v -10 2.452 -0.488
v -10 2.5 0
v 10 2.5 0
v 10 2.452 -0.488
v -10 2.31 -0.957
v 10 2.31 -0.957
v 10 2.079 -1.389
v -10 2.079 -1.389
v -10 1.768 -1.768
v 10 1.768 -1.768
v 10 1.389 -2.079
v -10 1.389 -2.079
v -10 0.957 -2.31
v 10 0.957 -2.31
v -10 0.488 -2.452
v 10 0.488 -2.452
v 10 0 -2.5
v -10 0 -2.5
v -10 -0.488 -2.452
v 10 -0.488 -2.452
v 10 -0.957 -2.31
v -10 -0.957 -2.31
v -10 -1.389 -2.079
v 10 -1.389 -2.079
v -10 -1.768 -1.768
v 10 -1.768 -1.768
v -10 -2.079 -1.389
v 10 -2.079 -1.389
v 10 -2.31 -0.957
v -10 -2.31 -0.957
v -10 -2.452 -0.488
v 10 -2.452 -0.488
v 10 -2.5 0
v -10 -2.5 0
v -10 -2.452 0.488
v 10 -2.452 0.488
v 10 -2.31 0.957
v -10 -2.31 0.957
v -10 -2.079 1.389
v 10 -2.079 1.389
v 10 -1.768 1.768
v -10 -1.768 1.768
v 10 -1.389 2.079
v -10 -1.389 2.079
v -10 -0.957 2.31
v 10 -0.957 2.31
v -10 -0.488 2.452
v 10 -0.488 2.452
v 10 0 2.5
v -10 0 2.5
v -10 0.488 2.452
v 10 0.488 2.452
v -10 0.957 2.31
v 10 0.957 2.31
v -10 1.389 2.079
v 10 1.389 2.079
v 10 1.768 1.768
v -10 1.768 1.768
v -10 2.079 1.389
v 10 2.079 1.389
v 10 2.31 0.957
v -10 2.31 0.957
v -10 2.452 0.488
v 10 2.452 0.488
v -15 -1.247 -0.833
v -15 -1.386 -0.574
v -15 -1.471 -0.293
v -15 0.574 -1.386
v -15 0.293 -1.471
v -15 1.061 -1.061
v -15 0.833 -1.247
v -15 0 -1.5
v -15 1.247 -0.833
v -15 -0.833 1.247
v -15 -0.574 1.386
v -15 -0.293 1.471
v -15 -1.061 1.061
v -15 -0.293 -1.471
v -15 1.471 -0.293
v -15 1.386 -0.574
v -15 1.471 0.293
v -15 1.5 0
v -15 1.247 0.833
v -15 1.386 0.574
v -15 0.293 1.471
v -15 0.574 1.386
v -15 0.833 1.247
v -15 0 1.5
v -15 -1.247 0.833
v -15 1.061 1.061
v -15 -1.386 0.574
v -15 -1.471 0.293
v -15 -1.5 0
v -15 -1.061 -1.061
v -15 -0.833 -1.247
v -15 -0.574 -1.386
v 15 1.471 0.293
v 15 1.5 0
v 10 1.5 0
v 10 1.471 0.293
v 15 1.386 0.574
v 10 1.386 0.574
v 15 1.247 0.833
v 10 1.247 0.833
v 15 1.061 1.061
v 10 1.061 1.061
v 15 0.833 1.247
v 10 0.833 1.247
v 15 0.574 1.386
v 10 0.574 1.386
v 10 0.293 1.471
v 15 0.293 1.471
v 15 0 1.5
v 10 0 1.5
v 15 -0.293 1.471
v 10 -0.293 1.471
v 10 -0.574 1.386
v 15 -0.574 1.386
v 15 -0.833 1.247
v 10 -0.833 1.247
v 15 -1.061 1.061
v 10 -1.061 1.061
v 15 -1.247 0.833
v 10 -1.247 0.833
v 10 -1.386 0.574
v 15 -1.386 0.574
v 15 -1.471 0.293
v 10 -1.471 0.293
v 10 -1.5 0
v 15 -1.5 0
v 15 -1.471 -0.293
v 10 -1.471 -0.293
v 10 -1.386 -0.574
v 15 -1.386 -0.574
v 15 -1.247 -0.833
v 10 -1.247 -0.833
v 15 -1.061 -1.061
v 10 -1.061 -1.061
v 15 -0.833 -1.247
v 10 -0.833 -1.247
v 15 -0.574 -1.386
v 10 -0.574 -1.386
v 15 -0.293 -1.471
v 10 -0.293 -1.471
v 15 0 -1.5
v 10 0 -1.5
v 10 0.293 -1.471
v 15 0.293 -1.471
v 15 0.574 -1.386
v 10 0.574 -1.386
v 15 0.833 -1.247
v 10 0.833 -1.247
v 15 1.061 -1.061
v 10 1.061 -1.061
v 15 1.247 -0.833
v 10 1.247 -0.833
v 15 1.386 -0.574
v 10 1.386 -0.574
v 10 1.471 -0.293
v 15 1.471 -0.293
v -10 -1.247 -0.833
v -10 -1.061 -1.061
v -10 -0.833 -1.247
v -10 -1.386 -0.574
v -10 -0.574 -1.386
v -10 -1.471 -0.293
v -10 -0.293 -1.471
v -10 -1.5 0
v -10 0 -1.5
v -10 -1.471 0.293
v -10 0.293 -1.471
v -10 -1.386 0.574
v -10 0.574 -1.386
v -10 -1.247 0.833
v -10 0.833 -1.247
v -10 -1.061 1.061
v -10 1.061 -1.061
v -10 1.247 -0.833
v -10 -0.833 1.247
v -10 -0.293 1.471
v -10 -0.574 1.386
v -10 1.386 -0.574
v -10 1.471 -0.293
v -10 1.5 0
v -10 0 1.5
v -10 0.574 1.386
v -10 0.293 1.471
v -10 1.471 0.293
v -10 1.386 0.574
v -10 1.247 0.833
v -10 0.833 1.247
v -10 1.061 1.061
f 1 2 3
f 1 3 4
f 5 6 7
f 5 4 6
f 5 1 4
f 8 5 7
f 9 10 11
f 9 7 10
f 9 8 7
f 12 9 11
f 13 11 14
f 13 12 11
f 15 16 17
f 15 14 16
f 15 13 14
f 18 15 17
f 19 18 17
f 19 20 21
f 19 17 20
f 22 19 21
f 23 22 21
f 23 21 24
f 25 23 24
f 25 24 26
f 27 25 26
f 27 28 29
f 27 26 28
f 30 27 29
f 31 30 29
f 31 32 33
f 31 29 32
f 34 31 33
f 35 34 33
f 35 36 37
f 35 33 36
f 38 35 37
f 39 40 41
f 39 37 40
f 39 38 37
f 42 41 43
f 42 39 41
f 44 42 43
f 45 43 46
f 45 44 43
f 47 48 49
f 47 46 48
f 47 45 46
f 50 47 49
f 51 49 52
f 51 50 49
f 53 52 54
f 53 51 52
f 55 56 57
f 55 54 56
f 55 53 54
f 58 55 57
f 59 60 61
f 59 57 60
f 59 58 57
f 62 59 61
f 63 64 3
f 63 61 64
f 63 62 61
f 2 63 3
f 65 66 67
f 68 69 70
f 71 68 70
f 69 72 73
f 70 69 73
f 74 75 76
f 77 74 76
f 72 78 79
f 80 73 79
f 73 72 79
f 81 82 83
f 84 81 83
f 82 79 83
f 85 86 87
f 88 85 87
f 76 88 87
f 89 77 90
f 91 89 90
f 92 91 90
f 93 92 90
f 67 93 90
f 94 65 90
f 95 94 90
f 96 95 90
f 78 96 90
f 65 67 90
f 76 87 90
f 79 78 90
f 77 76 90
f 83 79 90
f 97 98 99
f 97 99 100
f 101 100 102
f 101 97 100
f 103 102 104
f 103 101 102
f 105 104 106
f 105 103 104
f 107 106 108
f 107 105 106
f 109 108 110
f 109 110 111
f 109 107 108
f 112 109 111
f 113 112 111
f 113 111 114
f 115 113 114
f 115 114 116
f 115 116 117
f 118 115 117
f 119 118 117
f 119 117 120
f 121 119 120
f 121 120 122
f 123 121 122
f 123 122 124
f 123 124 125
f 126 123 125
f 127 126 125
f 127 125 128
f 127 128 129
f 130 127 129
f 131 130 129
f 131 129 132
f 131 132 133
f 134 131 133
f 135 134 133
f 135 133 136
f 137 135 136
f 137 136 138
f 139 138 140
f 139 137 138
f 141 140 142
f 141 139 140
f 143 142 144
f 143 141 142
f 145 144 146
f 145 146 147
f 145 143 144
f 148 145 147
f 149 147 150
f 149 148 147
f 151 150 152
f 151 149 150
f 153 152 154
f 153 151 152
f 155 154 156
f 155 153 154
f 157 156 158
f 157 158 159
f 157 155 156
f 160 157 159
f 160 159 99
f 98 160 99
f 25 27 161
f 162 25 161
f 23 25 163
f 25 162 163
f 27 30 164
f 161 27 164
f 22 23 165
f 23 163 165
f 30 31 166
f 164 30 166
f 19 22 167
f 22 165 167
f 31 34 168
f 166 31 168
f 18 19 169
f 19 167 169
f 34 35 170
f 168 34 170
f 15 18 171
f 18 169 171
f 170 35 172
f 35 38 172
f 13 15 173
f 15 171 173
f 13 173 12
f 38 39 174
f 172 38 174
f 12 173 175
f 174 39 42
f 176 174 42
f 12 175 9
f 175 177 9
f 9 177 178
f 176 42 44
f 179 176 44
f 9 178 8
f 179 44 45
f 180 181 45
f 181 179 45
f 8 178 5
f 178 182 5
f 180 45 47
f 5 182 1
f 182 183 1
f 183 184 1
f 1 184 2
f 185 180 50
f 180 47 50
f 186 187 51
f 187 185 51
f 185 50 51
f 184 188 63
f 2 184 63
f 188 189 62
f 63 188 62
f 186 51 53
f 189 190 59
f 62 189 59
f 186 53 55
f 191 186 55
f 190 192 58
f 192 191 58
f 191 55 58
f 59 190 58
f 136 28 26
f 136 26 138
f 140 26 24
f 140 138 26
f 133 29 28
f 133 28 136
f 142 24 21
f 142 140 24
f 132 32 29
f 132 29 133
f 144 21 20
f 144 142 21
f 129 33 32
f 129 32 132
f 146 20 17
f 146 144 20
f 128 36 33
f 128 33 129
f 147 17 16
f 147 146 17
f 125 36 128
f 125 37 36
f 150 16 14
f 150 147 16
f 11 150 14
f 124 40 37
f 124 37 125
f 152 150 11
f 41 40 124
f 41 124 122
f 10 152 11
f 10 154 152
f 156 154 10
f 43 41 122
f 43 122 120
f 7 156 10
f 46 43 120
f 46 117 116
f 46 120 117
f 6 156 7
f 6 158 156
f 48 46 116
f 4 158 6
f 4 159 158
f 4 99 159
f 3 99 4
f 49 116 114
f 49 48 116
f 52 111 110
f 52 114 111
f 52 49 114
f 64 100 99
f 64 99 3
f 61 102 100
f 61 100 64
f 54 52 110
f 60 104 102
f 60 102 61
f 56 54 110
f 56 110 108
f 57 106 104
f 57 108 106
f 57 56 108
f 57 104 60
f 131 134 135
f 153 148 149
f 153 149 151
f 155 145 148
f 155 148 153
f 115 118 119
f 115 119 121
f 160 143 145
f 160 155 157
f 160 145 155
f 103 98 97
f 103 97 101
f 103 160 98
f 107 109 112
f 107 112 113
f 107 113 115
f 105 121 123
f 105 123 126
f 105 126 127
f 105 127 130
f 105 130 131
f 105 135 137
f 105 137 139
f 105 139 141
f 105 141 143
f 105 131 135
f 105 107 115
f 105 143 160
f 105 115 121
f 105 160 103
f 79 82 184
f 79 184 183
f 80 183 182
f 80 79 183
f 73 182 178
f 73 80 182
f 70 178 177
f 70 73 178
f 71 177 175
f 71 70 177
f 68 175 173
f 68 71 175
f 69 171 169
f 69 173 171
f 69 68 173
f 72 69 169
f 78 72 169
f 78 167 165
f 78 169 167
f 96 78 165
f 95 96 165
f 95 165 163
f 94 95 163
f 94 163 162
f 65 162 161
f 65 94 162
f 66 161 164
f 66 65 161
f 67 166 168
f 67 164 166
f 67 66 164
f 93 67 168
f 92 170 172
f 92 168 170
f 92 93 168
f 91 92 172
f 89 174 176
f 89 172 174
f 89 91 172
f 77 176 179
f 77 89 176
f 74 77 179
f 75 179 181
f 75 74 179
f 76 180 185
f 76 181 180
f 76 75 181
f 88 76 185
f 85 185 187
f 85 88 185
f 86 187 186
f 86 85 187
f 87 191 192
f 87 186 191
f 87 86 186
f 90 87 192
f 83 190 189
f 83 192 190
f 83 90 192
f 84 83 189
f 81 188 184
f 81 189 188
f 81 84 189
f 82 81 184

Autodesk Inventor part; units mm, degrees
ref_plane "YZ Plane" through (0, 0, 0) normal (1, 0, 0) x (0, 1, 0)
ref_plane "XZ Plane" through (0, 0, 0) normal (0, 1, 0) x (-1, 0, 0)
ref_plane "XY Plane" through (0, 0, 0) normal (0, 0, 1) x (1, 0, 0)
sketch "Sketch2" plane through (0, 0, 0) normal (0, 0, 1) x (1, 0, 0)
  line L0 (-15, 0) -> (15, 0)
  line L1 (15, 0) -> (15, 2.5)
  line L2 (15, 2.5) -> (-15, 2.5)
  line L3 (-15, 2.5) -> (-15, 0)
  line L4 (15, 2.5) -> (10, 2.5)
  line L5 (10, 2.5) -> (10, 1.5)
  line L6 (10, 1.5) -> (15, 1.5)
  line L7 (15, 1.5) -> (15, 2.5)
  line L8 (-15, 2.5) -> (-10, 2.5)
  line L9 (-10, 2.5) -> (-10, 1.5)
  line L10 (-10, 1.5) -> (-15, 1.5)
  line L11 (-15, 1.5) -> (-15, 2.5)
  point P0 (0, 0)
  point P1 (0, 0)
  dimension "d3" = 30
  dimension "d4" = 2.5
  dimension "d5" = 1.5
  dimension "d6" = 5
revolve "Revolution1" add sketch "Sketch2" angle 360 about axis through (-15, 0, 0) along (1, 0, 0) contours L3 L10 L9 L2 L5 L6 L1 L0
properties part number "Pin" material "Stainless Steel"
